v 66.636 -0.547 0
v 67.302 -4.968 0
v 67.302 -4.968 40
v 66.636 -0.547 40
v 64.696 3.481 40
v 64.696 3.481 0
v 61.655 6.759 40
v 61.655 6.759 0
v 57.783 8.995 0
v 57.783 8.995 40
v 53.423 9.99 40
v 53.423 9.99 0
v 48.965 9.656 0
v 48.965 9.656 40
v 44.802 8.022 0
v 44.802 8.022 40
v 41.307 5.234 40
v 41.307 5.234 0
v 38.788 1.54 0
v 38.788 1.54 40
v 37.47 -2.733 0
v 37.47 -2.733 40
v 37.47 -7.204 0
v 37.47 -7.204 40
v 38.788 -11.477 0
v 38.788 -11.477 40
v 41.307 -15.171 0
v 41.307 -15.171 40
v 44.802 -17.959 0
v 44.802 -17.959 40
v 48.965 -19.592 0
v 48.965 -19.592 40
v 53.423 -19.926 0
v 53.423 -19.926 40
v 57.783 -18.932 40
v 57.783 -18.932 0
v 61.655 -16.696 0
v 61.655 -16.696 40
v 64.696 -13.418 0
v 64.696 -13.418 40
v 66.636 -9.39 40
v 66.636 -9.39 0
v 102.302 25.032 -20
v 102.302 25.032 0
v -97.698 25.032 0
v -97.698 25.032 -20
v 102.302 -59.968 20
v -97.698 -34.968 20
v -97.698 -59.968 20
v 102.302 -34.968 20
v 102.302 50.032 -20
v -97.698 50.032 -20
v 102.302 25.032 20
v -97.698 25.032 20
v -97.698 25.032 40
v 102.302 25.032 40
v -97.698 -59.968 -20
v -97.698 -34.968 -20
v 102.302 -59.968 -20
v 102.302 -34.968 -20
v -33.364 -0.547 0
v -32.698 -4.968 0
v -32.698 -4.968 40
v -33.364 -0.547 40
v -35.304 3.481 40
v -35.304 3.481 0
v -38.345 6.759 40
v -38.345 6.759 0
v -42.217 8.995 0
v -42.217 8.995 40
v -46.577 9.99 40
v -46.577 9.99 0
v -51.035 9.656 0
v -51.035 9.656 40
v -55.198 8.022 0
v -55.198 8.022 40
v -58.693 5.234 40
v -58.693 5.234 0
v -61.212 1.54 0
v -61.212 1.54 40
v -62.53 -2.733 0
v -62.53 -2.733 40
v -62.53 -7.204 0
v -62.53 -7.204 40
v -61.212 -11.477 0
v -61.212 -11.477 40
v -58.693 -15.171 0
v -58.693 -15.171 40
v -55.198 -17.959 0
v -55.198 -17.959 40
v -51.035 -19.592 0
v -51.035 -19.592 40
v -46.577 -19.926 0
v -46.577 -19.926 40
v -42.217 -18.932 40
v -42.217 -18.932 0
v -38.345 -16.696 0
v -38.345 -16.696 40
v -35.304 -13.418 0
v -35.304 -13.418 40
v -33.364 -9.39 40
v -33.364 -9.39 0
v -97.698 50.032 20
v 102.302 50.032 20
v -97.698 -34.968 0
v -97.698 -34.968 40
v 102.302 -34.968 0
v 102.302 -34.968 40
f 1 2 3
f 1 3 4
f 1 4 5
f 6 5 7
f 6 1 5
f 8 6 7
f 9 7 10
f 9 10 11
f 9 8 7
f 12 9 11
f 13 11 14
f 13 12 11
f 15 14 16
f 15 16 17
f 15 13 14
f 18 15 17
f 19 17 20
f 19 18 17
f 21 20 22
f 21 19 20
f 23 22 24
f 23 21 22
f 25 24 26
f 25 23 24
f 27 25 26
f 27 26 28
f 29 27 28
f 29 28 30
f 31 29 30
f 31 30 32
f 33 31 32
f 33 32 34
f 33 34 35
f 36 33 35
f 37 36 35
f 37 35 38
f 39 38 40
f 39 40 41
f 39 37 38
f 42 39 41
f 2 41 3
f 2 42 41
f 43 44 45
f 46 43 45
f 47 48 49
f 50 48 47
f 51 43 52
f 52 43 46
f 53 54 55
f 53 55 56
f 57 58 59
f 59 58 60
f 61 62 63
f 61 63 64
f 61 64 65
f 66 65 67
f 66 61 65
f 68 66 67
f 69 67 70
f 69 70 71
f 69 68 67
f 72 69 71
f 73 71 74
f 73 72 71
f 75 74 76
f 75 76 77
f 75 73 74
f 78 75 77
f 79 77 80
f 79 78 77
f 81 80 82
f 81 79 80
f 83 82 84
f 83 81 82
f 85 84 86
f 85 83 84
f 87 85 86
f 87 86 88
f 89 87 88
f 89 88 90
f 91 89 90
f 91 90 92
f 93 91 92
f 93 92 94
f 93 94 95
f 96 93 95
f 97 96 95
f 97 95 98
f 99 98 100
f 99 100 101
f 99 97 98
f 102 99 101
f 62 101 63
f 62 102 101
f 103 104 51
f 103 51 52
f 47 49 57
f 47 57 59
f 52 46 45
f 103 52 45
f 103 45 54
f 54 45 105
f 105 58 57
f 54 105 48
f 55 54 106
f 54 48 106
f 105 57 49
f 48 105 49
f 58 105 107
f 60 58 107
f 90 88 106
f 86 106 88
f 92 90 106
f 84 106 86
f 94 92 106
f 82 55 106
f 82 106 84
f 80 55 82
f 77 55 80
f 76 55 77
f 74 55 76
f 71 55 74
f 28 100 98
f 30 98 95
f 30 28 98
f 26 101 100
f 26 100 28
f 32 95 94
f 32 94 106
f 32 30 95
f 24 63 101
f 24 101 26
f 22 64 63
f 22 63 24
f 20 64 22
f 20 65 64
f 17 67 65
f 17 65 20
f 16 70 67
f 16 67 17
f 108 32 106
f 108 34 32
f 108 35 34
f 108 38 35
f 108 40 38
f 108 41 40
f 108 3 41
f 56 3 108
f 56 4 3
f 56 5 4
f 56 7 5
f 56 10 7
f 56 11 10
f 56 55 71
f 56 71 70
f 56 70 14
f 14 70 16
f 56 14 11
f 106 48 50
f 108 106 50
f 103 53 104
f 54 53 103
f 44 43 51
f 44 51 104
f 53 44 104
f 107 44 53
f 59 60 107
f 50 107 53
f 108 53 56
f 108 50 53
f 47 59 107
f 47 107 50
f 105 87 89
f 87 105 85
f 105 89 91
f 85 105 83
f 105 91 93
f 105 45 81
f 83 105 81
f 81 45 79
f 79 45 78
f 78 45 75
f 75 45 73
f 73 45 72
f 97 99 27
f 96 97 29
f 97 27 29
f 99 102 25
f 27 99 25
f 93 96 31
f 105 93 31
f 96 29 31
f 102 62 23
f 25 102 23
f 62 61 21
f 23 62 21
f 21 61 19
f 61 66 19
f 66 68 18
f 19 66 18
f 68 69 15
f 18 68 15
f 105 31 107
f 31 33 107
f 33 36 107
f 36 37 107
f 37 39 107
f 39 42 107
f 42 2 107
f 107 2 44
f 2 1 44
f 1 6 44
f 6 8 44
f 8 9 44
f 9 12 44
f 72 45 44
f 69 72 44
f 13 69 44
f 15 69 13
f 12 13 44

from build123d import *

# Parameters (mm, degrees)
F0_W     = 200
F0_H     = 60
F0_R     = 15
F1_DEPTH = 40
F2_W     = 200
F2_H     = 40
F3_DEPTH = 25
F4_W     = 200
F4_H     = 40
F5_DEPTH = 25


with BuildPart() as f1:
    # F0 (on Top) → F1 (new body)
    with BuildSketch(Plane.XY):
        with Locations((2.302447, -4.968402)):
            Rectangle(F0_W, F0_H)
        with Locations((-47.697553, -4.968402)):
            Circle(F0_R, mode=Mode.SUBTRACT)
        with Locations((52.302447, -4.968402)):
            Circle(F0_R, mode=Mode.SUBTRACT)
    extrude(amount=F1_DEPTH)

    # F2 (on face) → F3 (join)
    with BuildSketch(Plane.XZ.offset(34.968402)):
        with Locations((2.302447, 0)):
            Rectangle(F2_W, F2_H)
    extrude(amount=F3_DEPTH)

    # F4 (on face) → F5 (join)
    with BuildSketch(Plane(origin=(0, 25.031598, 0), x_dir=(-1, 0, 0), z_dir=(0, 1, 0))):
        with Locations((-2.302447, 0)):
            Rectangle(F4_W, F4_H)
    extrude(amount=F5_DEPTH)


solid = f1.part
